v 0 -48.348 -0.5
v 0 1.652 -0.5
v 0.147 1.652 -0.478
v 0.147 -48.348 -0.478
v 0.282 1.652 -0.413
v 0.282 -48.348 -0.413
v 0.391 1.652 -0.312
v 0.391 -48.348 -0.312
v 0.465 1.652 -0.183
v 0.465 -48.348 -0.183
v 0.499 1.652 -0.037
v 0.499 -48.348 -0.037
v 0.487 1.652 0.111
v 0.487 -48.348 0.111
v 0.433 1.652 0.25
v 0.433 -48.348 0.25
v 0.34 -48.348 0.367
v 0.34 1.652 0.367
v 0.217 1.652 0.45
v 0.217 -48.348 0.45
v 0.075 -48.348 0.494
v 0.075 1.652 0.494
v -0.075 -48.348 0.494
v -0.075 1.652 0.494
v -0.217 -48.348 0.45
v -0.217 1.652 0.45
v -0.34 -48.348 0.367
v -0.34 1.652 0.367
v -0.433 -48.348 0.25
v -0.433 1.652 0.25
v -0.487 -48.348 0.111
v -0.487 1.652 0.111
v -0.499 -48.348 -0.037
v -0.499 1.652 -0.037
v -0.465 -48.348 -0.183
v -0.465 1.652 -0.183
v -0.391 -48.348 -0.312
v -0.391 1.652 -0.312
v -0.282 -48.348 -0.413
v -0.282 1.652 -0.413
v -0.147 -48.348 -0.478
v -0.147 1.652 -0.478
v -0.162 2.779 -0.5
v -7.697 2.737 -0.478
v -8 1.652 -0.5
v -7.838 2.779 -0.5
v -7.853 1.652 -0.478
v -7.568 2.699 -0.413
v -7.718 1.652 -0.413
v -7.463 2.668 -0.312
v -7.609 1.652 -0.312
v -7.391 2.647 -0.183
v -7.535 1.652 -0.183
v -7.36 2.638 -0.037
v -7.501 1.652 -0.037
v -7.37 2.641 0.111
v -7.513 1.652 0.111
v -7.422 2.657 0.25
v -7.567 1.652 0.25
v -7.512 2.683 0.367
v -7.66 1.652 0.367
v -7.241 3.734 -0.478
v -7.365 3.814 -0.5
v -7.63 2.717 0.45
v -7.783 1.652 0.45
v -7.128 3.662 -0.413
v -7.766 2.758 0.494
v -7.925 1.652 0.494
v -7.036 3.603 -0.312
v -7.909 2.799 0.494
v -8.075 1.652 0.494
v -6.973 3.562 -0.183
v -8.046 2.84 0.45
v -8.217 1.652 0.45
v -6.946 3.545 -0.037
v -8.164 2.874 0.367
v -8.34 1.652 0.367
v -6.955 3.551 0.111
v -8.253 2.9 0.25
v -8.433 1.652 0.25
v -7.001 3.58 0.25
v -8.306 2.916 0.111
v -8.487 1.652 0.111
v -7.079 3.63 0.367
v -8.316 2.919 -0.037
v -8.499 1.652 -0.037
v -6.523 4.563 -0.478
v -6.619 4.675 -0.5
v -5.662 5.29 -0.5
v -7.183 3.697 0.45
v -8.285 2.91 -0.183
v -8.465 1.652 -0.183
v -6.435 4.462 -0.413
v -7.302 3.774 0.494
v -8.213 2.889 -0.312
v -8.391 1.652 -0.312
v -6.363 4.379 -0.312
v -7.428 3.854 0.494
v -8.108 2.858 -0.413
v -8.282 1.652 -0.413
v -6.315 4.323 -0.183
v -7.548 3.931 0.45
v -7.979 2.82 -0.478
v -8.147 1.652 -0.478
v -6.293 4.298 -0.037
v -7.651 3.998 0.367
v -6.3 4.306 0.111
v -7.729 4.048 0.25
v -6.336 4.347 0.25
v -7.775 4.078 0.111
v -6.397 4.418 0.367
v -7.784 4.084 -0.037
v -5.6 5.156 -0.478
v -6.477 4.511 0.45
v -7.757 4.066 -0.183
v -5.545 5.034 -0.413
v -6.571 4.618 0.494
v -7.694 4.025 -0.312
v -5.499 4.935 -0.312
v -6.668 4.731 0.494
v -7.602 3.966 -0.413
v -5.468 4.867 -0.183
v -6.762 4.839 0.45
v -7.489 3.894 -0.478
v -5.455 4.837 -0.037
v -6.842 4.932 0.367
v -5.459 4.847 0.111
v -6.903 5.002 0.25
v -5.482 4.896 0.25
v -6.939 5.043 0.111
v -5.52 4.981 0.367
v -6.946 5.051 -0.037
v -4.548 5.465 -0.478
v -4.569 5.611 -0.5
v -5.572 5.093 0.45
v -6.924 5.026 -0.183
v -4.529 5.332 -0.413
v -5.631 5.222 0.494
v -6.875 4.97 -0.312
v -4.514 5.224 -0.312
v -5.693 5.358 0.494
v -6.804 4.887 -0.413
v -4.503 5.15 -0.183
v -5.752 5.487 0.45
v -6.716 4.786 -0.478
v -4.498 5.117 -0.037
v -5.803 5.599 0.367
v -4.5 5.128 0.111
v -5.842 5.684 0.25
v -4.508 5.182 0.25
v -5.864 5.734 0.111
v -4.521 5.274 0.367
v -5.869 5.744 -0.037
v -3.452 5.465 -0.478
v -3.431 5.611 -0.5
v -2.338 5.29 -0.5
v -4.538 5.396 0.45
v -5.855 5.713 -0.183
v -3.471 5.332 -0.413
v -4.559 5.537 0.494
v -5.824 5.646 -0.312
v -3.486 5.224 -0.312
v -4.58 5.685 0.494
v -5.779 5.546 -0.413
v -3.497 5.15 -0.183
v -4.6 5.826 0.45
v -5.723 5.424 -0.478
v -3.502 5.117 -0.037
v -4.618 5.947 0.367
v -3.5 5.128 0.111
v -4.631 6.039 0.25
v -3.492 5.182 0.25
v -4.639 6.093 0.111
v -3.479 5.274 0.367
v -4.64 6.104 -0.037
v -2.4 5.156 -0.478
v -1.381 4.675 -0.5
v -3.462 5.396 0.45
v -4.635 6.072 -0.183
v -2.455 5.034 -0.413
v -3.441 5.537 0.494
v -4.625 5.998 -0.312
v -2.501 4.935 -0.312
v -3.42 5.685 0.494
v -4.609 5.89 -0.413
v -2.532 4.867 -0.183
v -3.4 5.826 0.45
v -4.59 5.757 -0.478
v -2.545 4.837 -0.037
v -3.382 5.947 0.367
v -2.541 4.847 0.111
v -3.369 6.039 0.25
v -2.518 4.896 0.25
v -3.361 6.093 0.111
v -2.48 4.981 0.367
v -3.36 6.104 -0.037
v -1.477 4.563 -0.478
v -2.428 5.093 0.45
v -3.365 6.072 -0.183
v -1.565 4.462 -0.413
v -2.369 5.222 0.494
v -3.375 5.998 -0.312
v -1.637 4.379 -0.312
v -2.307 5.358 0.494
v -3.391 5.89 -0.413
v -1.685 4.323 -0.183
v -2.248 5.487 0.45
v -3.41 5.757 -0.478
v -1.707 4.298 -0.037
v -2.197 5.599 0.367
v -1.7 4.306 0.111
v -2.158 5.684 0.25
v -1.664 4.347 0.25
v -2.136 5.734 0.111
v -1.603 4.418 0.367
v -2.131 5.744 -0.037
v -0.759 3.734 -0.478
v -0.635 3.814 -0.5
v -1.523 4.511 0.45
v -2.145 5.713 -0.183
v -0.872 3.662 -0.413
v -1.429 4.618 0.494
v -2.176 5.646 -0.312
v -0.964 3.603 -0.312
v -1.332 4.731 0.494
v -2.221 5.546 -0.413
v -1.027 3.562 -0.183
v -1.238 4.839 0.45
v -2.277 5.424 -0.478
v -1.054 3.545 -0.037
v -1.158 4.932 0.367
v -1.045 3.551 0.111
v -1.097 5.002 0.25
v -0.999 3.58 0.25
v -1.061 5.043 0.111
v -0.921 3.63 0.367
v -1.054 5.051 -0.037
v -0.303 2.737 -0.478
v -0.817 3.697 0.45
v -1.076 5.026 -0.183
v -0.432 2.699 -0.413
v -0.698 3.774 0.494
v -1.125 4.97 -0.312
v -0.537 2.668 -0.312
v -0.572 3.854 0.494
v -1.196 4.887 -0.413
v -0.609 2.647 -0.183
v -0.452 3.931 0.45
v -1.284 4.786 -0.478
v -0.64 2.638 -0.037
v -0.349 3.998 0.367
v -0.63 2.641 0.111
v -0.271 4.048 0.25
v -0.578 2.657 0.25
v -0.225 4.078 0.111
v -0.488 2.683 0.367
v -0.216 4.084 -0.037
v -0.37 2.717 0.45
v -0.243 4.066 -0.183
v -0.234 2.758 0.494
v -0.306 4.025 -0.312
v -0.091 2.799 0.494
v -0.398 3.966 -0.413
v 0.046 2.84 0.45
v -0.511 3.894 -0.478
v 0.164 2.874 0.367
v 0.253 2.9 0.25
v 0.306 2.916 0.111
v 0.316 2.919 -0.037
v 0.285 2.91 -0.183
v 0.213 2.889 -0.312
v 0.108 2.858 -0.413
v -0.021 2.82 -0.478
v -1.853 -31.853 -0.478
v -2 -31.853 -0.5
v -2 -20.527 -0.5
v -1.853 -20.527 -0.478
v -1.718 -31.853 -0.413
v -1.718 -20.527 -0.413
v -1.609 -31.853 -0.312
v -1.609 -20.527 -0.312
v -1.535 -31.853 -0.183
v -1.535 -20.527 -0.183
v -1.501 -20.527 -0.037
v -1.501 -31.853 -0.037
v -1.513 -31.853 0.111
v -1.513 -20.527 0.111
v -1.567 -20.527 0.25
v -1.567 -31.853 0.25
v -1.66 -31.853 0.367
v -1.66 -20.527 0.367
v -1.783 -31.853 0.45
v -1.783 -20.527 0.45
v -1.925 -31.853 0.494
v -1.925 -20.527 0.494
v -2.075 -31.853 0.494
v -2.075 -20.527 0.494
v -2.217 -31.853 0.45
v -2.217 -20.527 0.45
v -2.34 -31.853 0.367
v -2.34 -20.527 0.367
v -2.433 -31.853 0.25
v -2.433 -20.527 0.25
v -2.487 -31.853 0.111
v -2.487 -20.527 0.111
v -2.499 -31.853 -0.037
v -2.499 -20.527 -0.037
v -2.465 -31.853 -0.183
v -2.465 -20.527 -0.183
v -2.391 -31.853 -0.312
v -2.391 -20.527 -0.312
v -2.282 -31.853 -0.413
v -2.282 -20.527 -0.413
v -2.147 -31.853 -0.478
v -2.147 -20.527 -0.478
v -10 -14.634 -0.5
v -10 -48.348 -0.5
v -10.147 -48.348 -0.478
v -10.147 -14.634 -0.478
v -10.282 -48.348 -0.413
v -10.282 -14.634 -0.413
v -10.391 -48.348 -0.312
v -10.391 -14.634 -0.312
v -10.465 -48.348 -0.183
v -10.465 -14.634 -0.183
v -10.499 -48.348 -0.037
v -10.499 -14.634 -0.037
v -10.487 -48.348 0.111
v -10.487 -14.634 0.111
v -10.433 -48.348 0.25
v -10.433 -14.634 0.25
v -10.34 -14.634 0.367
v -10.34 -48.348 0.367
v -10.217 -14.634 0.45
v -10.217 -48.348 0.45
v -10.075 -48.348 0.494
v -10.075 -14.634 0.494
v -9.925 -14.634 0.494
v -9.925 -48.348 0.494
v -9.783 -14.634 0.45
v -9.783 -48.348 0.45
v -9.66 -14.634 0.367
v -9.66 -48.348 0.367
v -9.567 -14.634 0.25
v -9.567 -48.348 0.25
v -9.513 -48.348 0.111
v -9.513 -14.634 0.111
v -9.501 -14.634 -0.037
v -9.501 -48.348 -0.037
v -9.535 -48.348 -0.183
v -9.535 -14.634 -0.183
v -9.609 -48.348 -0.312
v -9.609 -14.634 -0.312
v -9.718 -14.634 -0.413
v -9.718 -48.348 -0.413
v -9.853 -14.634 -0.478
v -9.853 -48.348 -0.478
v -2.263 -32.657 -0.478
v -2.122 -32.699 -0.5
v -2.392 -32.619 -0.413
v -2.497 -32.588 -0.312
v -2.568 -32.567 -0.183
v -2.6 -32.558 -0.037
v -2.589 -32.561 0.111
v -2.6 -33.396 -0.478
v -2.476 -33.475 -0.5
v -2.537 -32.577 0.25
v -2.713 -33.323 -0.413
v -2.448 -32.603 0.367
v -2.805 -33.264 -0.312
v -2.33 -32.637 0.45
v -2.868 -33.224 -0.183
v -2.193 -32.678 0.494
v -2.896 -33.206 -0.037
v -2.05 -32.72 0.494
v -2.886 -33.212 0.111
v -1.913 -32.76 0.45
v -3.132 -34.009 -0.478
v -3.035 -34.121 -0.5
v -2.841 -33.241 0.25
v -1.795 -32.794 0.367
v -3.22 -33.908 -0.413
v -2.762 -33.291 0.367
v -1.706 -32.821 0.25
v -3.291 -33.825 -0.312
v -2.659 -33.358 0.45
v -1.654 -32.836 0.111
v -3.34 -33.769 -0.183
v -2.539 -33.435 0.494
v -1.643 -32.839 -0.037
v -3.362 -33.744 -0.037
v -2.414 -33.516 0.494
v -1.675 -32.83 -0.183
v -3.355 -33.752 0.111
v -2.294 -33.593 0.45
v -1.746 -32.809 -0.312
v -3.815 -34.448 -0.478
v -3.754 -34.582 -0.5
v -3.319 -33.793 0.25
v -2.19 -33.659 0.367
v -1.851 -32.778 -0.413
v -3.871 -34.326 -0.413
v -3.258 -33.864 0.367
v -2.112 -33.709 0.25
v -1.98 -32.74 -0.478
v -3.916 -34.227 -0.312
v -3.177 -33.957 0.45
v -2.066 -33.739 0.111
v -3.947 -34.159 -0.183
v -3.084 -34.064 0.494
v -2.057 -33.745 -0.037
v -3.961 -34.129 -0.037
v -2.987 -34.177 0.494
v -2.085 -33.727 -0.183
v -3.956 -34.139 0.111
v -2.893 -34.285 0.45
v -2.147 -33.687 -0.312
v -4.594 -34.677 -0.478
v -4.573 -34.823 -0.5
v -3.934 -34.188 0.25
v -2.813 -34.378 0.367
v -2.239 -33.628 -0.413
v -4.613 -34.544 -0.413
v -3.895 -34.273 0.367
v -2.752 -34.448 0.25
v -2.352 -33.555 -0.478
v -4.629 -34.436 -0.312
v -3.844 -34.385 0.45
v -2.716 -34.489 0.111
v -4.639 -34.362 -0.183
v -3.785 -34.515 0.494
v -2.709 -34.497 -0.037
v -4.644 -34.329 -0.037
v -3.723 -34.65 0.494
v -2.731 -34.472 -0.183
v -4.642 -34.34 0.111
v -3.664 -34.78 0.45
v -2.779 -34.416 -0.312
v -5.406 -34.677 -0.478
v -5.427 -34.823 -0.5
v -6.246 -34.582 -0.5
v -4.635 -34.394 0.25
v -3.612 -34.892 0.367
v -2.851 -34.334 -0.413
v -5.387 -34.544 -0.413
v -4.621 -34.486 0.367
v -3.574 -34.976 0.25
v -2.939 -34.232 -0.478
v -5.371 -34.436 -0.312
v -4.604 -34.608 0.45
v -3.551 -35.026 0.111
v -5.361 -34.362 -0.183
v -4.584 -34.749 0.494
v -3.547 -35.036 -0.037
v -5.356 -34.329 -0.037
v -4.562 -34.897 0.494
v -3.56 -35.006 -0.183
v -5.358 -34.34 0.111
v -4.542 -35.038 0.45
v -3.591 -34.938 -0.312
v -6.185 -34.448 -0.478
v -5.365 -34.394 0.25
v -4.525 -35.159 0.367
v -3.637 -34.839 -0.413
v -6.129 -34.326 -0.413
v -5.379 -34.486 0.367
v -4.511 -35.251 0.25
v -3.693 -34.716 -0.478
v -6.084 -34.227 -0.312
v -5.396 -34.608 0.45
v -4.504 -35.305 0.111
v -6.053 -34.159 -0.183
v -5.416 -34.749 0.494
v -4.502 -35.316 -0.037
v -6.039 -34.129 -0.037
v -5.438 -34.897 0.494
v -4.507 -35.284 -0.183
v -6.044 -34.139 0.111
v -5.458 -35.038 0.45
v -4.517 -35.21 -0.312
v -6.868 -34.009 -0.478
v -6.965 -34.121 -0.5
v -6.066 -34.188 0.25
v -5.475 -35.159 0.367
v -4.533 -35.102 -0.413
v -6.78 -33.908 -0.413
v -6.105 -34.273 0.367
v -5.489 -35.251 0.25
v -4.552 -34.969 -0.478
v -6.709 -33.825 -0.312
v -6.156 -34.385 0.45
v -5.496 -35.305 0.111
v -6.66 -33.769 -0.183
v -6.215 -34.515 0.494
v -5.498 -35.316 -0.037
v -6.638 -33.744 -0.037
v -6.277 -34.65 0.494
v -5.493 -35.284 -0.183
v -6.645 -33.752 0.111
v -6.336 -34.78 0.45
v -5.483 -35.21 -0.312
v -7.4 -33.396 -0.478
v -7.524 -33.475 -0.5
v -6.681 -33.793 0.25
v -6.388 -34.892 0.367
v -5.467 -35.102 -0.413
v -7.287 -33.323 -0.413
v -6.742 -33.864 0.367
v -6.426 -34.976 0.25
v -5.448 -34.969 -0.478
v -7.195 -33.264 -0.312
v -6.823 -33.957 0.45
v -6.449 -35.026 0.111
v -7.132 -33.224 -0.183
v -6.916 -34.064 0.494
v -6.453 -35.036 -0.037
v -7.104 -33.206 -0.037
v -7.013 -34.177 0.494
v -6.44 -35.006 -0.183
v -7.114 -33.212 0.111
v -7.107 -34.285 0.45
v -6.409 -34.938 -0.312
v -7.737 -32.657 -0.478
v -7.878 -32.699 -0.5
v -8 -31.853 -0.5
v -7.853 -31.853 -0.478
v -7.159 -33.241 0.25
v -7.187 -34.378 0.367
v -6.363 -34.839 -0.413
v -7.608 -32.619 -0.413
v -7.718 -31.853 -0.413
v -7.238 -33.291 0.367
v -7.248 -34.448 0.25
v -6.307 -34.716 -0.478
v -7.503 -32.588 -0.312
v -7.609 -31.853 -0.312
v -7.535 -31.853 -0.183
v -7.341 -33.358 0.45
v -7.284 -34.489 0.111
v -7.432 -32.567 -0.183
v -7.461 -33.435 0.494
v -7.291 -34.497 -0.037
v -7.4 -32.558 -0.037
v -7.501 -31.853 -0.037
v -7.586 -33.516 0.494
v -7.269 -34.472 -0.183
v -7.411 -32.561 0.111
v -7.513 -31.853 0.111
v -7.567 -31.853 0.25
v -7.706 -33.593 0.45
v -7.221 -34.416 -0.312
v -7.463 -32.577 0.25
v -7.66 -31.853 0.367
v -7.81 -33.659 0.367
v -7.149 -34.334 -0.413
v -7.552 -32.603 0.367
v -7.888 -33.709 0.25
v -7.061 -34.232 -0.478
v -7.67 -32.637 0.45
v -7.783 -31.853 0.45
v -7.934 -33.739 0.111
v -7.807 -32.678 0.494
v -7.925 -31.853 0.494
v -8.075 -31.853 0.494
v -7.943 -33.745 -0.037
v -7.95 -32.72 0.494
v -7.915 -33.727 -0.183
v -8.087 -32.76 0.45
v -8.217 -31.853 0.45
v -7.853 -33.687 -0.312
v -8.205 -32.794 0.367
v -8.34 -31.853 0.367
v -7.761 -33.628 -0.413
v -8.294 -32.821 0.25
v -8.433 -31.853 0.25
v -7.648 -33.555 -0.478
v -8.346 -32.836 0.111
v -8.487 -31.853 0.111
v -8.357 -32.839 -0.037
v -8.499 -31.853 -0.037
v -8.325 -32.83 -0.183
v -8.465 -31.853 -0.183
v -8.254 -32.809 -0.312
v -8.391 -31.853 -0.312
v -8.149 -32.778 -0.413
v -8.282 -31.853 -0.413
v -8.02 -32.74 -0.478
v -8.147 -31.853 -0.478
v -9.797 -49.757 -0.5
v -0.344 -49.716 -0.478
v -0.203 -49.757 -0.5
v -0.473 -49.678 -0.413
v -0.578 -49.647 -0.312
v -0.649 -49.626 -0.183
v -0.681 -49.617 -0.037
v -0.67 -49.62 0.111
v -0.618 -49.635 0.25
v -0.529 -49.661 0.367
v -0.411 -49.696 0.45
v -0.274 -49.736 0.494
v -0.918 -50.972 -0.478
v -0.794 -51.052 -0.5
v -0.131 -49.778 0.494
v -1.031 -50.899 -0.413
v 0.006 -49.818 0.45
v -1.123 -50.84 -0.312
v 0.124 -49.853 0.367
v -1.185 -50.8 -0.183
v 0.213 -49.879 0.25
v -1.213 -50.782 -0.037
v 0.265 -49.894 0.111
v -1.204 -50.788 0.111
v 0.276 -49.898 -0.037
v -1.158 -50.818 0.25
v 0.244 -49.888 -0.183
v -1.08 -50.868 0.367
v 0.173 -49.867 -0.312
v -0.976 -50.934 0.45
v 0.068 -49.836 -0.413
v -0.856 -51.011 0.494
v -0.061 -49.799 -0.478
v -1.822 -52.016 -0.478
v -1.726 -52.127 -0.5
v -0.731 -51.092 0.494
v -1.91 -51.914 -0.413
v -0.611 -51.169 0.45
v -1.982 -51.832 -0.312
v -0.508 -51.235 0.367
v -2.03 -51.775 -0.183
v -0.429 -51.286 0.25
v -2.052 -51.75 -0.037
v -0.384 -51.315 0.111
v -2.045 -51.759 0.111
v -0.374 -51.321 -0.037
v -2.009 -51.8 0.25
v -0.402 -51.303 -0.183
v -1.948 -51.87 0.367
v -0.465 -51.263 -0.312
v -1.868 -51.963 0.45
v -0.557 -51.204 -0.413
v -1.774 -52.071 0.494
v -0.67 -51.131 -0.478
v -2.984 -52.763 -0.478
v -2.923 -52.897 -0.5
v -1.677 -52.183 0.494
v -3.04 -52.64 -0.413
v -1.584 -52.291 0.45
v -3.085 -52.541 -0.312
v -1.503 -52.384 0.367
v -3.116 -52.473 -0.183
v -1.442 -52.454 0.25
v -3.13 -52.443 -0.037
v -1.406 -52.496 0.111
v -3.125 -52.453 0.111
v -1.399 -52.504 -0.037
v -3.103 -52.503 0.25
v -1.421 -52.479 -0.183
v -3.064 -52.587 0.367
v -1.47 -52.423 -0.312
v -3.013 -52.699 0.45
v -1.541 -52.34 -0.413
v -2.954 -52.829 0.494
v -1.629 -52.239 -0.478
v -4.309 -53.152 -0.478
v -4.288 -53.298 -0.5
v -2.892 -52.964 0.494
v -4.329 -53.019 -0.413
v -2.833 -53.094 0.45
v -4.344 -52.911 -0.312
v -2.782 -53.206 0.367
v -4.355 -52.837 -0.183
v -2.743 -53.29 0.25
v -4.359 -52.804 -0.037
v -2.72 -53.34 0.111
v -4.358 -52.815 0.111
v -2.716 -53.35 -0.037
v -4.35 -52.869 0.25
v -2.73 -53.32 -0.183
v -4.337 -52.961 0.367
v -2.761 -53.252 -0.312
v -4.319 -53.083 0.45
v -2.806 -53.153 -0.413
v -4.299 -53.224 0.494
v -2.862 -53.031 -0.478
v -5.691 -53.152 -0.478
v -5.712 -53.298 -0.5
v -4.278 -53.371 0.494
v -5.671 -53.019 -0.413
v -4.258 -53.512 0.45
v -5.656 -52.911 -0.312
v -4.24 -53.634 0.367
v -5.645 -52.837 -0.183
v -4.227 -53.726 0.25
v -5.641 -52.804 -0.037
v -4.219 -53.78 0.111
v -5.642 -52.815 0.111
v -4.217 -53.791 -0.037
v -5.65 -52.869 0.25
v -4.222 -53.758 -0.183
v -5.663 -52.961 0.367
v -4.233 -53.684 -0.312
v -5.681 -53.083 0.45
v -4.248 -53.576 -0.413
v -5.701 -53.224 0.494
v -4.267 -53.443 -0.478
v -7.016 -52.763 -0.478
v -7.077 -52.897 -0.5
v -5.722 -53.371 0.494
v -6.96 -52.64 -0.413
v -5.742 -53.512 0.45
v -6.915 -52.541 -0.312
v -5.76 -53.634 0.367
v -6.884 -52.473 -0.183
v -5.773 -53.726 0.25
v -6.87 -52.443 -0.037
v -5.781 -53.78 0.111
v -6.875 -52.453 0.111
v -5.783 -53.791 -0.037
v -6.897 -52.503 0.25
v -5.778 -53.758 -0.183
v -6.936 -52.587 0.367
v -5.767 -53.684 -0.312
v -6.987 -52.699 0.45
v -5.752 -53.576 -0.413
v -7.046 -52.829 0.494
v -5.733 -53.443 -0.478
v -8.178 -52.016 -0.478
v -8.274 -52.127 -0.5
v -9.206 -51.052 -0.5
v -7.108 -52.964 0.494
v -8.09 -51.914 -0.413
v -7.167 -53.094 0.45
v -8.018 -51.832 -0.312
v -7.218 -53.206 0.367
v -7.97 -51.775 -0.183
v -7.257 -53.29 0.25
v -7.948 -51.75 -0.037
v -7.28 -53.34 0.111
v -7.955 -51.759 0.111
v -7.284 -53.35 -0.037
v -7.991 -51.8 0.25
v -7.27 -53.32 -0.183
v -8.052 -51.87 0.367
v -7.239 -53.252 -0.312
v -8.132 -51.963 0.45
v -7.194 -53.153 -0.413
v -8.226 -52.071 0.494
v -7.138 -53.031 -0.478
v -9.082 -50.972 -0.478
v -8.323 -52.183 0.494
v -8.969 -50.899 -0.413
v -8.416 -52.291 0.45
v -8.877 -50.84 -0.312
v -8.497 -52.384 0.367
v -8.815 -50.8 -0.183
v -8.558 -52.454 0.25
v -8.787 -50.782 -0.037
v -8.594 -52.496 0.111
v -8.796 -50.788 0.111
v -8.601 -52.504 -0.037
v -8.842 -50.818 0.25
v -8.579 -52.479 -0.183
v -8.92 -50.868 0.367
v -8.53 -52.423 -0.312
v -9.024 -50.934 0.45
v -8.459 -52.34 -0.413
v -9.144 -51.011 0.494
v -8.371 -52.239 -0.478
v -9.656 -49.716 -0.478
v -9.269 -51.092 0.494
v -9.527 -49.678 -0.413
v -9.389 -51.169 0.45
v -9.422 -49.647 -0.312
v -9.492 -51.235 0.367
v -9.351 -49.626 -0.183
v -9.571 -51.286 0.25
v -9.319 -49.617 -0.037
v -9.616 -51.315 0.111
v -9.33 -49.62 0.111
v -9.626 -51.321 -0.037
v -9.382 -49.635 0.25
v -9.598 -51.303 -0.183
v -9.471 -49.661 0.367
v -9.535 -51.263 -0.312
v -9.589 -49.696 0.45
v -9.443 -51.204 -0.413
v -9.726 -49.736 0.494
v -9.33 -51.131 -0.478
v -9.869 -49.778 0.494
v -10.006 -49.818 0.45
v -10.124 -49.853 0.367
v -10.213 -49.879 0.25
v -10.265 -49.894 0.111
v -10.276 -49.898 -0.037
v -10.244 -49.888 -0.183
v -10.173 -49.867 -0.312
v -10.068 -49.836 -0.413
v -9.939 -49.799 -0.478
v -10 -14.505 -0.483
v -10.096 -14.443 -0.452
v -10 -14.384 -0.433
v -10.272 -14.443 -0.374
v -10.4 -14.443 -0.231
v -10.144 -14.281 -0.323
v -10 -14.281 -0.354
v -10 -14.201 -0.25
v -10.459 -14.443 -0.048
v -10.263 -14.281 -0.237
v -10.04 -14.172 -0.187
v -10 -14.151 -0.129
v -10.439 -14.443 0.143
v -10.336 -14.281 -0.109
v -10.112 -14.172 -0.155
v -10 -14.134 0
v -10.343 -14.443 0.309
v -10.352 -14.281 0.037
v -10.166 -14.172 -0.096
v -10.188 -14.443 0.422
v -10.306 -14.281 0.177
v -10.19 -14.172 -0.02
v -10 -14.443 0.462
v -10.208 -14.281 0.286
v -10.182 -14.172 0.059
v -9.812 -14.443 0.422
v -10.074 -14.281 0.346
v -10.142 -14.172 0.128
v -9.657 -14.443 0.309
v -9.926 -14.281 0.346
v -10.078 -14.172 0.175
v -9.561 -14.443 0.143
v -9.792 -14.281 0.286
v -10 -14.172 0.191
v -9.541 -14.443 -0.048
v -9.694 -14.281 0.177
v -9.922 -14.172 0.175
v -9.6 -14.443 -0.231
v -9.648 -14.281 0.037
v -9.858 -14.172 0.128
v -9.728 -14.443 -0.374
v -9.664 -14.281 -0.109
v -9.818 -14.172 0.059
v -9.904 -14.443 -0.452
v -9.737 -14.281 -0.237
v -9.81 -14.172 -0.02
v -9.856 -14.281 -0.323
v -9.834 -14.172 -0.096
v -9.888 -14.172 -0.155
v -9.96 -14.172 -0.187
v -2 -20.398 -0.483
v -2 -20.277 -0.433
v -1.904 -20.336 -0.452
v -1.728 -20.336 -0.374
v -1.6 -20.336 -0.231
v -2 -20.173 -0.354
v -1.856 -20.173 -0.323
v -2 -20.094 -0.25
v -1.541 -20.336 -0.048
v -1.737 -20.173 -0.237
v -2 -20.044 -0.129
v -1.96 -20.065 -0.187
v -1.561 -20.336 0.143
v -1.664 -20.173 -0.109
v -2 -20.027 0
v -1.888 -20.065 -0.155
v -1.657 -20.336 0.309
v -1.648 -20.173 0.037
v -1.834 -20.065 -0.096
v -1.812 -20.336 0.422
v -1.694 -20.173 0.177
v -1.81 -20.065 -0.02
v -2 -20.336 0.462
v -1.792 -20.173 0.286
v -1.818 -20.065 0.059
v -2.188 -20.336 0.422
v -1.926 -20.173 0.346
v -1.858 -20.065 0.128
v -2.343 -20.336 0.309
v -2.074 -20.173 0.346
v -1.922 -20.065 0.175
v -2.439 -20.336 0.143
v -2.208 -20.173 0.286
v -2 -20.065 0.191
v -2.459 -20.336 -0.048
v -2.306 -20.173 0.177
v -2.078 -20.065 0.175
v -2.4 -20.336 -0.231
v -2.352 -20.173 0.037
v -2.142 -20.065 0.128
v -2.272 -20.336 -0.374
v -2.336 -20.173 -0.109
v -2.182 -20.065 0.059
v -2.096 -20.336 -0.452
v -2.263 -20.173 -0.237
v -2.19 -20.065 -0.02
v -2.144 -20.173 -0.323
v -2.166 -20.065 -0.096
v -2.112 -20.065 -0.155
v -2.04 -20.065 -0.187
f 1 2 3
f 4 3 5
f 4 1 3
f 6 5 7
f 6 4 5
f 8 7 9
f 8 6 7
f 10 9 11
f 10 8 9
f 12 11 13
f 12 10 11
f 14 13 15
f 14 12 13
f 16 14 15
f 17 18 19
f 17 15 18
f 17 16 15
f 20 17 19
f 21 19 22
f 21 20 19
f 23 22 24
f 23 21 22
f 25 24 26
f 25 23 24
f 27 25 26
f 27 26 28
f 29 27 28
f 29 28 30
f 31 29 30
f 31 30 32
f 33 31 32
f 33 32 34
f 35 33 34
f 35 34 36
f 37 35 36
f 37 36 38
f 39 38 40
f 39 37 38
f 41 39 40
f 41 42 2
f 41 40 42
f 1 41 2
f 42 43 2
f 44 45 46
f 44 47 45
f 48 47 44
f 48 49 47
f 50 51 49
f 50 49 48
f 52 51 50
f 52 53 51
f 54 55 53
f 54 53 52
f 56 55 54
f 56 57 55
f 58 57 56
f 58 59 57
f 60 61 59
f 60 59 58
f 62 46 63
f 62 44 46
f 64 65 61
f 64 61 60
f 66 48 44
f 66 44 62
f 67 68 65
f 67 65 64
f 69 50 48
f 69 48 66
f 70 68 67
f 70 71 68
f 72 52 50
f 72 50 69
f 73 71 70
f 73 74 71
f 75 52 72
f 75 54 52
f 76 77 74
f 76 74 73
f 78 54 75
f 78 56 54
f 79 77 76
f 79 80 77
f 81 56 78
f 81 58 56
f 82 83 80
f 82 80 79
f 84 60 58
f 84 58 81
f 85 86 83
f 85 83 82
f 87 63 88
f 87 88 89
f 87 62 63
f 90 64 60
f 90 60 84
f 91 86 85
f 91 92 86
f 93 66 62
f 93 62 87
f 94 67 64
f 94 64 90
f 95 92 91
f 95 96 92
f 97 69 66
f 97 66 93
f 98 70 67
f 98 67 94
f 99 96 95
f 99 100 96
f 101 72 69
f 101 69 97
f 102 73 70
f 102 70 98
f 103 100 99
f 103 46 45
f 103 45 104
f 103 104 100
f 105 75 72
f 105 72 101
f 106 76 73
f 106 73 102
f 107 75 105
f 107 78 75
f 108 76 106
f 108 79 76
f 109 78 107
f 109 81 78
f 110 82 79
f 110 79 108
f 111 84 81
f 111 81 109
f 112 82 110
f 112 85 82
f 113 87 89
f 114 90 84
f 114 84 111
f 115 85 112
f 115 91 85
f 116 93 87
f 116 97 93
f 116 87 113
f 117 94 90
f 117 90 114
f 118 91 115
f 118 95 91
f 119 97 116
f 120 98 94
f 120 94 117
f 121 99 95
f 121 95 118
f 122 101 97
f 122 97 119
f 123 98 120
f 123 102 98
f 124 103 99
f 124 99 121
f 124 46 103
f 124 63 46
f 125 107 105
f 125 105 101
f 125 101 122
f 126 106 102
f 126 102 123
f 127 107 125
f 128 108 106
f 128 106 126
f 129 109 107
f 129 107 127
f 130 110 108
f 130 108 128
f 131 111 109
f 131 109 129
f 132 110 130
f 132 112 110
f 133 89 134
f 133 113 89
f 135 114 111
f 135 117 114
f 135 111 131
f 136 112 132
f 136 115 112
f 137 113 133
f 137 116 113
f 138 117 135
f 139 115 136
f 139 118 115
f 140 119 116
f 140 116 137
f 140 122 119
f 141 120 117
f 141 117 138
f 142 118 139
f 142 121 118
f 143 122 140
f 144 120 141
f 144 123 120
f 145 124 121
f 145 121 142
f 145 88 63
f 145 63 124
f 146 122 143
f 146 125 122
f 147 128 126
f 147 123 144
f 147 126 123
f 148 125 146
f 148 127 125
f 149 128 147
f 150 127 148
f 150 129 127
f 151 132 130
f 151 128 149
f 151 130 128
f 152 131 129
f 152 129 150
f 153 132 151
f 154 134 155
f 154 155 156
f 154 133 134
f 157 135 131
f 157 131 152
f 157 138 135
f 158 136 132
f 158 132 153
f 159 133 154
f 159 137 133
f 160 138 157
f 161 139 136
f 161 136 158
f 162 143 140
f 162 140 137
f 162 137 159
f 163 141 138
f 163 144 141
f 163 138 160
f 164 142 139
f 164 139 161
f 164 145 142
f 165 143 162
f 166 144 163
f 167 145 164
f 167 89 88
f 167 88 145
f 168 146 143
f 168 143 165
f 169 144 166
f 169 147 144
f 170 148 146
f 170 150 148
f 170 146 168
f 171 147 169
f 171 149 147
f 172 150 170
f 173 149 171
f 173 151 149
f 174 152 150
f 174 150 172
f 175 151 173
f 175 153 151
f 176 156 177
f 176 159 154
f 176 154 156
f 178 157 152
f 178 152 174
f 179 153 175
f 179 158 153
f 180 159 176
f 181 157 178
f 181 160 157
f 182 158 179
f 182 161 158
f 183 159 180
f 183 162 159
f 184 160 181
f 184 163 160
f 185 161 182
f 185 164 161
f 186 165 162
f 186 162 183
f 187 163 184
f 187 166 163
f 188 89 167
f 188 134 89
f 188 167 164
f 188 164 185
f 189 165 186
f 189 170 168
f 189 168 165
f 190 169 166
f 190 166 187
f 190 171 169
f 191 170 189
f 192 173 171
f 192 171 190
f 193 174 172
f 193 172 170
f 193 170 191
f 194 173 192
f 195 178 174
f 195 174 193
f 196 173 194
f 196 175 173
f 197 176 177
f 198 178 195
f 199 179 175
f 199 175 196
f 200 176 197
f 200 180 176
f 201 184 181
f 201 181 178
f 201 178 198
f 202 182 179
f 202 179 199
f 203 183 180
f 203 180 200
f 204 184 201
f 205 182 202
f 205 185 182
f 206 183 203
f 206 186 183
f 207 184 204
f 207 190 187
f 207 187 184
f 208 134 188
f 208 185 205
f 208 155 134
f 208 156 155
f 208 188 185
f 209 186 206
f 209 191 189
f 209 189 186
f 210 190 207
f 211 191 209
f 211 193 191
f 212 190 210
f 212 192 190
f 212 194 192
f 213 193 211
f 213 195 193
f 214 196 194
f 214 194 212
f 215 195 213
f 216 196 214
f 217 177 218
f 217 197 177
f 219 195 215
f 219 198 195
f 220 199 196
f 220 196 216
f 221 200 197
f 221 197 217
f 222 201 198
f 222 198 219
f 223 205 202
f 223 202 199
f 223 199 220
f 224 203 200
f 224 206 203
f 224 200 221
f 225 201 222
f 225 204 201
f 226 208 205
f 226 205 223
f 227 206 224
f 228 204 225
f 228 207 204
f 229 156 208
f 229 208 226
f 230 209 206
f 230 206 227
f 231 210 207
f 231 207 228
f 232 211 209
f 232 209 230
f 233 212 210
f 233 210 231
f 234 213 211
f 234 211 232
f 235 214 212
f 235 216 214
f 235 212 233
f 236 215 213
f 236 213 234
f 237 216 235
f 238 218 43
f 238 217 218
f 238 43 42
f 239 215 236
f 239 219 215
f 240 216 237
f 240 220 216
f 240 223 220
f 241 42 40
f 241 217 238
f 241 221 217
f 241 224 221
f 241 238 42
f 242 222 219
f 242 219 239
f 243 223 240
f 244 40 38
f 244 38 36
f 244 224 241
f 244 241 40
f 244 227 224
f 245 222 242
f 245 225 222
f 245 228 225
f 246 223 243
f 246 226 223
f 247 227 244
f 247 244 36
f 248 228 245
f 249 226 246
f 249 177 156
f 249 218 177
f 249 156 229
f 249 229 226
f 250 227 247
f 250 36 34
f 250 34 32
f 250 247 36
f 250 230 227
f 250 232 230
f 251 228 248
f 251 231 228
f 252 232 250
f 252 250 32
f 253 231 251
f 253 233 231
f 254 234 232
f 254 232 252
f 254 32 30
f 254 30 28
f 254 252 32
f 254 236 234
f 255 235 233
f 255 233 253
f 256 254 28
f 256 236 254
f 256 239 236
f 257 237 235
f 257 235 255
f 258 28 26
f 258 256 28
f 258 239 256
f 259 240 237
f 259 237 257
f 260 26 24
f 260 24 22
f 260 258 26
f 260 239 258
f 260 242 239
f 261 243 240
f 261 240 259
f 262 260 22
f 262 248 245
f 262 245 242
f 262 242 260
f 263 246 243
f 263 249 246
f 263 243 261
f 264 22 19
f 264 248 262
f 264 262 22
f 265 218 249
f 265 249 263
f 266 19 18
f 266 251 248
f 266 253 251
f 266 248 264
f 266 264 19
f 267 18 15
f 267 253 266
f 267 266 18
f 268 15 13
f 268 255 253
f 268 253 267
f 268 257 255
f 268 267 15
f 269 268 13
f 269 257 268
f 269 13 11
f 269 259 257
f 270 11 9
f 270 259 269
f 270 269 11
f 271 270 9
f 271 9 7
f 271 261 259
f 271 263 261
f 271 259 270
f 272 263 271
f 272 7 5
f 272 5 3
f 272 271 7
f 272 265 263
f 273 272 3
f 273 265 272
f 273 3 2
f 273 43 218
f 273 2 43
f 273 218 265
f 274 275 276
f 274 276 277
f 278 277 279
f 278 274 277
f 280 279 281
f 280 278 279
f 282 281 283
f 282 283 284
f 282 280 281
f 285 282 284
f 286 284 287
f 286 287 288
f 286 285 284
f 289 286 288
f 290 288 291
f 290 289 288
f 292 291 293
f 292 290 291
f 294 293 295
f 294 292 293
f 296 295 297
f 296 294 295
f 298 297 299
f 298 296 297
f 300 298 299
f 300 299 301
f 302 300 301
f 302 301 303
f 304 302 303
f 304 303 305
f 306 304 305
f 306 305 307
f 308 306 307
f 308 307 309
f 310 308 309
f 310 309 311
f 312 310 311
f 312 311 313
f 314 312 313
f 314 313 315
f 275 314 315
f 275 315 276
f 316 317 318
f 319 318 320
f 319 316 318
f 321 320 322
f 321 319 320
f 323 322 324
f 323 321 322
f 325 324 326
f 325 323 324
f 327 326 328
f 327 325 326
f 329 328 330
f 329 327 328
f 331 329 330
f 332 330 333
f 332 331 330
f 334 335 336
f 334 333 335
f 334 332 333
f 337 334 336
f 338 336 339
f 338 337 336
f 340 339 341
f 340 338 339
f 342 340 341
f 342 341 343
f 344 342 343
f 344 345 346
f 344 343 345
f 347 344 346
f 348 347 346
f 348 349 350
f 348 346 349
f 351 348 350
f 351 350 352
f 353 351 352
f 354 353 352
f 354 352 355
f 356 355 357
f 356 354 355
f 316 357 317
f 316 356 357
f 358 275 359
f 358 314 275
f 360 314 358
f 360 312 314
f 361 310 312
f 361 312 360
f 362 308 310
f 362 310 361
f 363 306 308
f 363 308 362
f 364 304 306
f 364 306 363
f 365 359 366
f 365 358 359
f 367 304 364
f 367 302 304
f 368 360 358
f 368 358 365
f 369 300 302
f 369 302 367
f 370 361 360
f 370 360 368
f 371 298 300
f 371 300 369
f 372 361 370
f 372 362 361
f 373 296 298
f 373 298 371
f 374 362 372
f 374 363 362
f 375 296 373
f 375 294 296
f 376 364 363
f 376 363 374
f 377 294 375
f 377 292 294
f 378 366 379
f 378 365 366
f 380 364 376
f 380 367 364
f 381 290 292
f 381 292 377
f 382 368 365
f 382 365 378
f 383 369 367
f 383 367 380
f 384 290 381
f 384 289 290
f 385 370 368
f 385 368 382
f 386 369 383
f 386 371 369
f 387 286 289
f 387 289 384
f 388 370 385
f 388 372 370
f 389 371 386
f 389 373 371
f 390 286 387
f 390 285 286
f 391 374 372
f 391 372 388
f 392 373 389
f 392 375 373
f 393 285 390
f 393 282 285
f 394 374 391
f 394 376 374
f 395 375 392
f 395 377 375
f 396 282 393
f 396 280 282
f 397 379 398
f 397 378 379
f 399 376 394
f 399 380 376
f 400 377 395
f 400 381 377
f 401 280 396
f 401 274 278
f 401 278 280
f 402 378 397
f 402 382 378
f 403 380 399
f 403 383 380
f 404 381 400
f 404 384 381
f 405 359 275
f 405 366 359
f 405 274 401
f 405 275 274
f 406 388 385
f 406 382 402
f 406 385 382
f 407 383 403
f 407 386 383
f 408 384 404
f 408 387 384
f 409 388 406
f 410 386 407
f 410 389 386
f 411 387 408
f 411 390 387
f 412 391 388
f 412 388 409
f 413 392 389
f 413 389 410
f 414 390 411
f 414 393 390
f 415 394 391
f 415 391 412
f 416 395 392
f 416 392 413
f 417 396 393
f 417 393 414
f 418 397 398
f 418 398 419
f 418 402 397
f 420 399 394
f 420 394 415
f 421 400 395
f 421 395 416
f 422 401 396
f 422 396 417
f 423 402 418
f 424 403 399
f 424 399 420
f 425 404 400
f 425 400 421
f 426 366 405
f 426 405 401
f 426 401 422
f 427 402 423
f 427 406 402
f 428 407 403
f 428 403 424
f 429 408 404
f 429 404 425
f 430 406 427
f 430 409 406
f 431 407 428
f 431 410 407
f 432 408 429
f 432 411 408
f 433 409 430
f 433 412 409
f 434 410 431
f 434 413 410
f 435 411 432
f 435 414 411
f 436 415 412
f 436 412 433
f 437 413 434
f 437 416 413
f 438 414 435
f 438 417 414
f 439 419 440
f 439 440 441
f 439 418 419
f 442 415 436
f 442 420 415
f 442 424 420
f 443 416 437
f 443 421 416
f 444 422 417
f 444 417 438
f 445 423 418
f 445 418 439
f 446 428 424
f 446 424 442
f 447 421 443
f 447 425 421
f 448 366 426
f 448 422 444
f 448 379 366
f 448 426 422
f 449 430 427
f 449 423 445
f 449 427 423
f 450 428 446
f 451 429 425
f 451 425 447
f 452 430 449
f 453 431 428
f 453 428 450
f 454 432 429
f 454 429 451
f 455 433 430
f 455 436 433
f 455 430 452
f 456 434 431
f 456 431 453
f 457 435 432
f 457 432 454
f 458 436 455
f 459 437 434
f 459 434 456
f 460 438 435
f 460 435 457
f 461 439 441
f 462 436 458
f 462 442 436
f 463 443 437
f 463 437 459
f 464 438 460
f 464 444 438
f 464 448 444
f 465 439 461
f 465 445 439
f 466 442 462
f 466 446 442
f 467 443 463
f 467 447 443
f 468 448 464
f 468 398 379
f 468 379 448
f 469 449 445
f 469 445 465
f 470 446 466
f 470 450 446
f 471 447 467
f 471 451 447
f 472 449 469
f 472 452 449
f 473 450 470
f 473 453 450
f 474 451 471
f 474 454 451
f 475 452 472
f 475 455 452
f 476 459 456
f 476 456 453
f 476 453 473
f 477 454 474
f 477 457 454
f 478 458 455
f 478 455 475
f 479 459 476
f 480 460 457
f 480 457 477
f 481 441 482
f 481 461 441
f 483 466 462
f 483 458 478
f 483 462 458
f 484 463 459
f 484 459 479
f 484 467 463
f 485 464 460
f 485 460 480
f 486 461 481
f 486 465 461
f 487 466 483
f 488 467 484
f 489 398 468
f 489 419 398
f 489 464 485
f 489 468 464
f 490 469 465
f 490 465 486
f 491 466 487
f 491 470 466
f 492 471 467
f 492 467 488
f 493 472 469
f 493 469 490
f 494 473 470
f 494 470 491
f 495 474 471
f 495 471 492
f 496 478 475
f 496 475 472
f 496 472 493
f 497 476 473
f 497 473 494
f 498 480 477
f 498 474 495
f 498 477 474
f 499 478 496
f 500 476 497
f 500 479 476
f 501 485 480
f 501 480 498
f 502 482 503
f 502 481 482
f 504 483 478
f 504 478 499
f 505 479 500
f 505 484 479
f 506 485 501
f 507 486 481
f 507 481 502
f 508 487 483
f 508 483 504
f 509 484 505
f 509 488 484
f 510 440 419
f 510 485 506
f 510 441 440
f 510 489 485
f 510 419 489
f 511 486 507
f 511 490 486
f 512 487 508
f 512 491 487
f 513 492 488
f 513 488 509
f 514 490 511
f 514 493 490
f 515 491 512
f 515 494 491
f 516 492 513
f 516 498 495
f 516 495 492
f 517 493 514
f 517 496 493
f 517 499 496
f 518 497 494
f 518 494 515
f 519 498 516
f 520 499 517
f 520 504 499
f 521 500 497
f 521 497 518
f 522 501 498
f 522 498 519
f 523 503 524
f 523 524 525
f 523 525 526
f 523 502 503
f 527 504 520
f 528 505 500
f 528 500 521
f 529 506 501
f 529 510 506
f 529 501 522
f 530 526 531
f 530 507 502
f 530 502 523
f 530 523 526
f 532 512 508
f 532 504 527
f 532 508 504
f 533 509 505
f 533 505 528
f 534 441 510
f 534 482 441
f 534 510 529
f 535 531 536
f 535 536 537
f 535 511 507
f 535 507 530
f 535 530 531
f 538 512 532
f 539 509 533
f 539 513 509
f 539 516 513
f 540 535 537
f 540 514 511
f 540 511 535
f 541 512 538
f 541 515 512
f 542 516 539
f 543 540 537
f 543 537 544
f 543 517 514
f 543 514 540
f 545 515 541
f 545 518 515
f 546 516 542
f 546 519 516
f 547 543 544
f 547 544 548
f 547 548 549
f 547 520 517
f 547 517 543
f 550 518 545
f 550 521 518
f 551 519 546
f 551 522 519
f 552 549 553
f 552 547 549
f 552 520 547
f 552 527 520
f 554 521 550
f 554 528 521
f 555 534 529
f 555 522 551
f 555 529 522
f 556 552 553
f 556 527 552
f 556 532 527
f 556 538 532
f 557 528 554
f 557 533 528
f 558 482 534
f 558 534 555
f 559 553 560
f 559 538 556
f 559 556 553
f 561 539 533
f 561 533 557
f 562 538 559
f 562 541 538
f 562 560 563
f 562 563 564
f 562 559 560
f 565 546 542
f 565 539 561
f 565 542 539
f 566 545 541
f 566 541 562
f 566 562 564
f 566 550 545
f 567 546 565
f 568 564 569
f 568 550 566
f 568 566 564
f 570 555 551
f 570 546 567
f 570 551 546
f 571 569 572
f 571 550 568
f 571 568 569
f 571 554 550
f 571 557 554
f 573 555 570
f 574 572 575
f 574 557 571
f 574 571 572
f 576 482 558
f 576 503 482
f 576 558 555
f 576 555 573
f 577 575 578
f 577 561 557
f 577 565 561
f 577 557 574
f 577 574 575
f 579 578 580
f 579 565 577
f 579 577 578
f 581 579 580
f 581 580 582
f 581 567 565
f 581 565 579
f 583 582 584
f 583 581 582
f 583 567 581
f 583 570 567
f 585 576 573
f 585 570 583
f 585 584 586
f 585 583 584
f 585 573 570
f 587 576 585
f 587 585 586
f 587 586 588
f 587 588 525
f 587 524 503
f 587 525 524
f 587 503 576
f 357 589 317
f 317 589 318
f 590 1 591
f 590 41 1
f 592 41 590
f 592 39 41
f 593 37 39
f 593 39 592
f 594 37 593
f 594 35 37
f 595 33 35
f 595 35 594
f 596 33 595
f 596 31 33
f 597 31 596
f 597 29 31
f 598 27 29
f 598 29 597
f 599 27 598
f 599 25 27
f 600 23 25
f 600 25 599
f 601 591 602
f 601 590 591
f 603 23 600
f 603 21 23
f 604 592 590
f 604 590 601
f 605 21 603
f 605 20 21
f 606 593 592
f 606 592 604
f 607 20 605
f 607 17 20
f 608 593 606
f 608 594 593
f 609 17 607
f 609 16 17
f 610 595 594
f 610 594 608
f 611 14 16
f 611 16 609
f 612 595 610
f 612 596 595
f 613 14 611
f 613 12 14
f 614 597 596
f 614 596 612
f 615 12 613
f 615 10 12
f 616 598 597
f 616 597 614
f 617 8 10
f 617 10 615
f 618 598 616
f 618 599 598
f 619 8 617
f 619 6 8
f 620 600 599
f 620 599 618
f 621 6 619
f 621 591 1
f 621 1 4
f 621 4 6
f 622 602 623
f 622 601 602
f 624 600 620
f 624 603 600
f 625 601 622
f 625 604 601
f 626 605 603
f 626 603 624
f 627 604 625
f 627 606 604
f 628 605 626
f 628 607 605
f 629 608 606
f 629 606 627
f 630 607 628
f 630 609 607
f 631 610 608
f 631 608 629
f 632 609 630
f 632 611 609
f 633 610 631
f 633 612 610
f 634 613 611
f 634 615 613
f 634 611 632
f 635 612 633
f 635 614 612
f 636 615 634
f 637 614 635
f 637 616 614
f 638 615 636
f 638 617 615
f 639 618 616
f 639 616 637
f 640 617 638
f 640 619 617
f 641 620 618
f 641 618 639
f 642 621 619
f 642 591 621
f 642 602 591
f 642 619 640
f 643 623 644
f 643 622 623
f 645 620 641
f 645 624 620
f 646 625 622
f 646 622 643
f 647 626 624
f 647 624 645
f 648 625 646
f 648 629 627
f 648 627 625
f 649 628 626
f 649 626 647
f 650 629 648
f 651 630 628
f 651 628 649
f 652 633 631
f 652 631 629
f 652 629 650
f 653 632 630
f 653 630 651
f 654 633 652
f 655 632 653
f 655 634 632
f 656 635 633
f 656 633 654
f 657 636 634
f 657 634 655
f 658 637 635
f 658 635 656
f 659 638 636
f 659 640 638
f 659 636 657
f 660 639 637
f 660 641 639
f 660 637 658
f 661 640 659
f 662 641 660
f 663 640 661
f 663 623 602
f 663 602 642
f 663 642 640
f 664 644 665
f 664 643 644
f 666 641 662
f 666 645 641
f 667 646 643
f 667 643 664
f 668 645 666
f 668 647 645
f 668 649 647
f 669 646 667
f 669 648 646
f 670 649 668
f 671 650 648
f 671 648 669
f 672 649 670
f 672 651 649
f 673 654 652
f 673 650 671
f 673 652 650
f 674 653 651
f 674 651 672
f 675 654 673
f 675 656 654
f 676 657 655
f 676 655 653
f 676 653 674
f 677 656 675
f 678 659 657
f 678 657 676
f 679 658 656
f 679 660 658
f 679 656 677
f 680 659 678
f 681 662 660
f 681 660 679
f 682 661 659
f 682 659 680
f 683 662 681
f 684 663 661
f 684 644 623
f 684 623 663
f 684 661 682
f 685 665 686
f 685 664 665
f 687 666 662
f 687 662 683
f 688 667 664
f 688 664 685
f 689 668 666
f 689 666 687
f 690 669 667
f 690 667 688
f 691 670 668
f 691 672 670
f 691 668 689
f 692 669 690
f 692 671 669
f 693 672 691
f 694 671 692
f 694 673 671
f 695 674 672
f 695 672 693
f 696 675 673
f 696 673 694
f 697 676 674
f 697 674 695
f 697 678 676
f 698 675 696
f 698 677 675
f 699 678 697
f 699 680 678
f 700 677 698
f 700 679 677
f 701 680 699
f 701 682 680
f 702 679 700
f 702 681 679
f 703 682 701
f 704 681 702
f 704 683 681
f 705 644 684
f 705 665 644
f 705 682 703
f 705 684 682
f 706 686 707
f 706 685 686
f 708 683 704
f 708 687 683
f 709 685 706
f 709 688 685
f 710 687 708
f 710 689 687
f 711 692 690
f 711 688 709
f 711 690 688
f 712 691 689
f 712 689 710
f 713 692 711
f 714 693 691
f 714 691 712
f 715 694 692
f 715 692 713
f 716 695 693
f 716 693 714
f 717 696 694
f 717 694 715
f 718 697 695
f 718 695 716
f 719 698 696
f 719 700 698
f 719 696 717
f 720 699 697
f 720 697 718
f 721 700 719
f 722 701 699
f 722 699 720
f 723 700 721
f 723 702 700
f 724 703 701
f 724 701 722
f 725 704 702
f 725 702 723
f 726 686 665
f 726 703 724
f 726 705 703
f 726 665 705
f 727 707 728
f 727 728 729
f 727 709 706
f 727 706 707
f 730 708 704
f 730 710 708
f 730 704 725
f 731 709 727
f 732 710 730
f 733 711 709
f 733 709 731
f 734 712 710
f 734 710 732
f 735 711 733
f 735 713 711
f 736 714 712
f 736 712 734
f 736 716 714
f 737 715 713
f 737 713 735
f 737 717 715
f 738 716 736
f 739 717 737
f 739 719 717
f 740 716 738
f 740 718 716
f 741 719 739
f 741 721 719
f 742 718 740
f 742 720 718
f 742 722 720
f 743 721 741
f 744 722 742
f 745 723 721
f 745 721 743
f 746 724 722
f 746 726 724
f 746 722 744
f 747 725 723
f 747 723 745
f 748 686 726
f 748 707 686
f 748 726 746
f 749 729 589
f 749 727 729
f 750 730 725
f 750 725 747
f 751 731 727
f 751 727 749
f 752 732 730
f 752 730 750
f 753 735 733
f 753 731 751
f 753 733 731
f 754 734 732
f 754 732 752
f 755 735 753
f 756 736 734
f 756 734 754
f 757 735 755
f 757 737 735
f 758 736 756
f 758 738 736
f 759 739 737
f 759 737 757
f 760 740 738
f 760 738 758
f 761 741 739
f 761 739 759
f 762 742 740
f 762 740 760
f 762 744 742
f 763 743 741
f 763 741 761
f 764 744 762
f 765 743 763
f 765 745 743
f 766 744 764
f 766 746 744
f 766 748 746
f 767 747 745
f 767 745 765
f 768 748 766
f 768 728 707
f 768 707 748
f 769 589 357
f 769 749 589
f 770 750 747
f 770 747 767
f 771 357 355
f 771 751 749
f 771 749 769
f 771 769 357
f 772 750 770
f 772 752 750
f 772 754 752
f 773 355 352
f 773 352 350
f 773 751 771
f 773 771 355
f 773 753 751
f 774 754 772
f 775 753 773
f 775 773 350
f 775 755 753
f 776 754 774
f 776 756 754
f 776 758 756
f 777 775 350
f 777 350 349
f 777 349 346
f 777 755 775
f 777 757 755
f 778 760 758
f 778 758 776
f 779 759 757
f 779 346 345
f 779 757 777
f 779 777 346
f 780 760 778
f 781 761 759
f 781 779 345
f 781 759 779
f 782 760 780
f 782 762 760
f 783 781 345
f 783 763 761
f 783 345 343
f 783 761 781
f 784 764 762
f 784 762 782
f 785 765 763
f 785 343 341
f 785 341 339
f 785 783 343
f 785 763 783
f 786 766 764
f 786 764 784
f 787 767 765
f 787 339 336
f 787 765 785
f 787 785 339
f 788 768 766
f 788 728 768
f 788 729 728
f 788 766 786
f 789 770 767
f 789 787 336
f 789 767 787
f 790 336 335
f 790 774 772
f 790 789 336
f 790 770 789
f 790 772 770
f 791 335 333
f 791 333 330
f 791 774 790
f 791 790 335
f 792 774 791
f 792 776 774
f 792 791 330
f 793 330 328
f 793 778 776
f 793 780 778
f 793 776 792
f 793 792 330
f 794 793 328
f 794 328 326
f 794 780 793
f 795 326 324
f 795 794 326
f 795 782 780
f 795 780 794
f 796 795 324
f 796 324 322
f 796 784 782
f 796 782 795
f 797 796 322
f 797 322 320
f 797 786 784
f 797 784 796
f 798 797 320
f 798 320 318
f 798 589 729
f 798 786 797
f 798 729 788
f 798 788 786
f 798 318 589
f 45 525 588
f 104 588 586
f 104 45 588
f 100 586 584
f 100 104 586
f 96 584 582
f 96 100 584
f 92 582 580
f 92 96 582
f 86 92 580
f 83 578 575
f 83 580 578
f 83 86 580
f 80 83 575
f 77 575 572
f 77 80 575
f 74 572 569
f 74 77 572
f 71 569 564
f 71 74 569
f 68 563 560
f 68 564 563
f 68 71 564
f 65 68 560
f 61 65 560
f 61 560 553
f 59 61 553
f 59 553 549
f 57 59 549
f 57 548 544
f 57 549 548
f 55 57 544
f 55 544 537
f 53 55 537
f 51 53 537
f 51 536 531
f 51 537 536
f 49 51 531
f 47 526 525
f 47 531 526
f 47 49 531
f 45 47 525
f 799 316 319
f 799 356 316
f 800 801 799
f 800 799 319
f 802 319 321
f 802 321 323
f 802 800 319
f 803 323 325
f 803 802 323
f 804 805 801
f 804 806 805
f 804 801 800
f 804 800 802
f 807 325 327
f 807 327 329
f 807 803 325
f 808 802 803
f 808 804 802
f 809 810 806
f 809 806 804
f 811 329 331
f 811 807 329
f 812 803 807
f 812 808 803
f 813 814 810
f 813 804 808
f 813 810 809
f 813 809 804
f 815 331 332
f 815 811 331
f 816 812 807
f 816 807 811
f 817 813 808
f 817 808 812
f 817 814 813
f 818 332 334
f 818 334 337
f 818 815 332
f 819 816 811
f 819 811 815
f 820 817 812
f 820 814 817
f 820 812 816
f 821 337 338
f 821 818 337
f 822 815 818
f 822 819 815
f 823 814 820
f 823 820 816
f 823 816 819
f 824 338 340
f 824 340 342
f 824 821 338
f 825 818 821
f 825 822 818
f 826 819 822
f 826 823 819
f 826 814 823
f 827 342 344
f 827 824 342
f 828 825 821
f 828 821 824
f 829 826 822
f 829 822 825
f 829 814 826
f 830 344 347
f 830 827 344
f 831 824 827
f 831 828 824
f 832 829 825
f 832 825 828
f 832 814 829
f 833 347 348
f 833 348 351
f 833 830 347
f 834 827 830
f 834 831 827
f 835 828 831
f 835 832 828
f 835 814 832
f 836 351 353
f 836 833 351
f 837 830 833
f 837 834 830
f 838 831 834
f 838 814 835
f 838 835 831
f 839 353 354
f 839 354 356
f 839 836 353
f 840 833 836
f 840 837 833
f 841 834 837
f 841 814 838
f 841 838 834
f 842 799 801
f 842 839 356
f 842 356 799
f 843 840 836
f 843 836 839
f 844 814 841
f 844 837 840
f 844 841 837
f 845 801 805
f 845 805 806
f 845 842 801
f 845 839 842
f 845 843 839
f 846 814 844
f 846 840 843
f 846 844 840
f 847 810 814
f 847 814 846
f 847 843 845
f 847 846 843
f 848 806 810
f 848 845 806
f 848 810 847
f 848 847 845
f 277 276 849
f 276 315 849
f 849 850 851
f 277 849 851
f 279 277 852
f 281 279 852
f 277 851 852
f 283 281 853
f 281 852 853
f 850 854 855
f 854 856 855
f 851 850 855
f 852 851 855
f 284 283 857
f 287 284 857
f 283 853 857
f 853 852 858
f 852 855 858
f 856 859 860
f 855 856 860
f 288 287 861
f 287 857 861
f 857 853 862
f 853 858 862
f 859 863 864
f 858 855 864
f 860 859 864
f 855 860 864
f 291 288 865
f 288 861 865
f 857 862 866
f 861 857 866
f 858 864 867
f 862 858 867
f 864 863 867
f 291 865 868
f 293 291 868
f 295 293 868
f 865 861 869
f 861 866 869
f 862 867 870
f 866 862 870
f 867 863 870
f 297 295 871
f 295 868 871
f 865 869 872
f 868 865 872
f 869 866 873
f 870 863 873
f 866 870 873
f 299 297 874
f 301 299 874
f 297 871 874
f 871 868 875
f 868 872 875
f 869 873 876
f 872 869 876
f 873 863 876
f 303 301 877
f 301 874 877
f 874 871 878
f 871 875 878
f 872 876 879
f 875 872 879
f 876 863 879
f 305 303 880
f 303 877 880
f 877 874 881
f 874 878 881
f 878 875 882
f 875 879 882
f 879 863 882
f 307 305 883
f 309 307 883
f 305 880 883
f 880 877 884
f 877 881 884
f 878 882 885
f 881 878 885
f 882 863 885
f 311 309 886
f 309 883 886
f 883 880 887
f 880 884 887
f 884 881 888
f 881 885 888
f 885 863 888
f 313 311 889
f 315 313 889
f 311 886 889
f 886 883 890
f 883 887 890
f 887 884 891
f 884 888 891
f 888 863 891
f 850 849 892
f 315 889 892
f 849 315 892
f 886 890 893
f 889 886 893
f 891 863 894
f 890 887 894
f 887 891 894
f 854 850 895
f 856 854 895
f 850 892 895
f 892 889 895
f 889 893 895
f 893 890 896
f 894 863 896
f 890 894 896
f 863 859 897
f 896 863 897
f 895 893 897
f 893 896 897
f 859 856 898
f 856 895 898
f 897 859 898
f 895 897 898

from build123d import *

# Parameters (mm, degrees)
BARRER1_PROFILE_R = 0.5
REDONDEO1_R       = 0.5
REDONDEO2_R       = 0.5


with BuildPart() as part:
    # Barrer1: sweep along a path in Croquis2
    with BuildLine(Plane.XY) as barrer1_path:
        Line((-2, -20.026919646), (-2, -31.853401443))
        ThreePointArc((-2, -31.853401443), (-5, -34.853401443), (-8, -31.853401443))
        Line((-8, -31.853401443), (-8, 1.651570193))
        ThreePointArc((-8, 1.651570193), (-4, 5.651570193), (0, 1.651570193))
        Line((0, 1.651570193), (0, -48.348429807))
        ThreePointArc((0, -48.348429807), (-5, -53.348429807), (-10, -48.348429807))
        Line((-10, -48.348429807), (-10, -14.134208692))
    # Barrer1 profile (on start of the path) → Barrer1 (sweep)
    with BuildSketch(Plane(origin=(-2, -20.026919646, 0), x_dir=(0, 0, -1), z_dir=(0, -1, 0))):
        Circle(BARRER1_PROFILE_R)
    sweep(path=barrer1_path.line)

    # Redondeo1
    redondeo1_edges = [part.edges().sort_by_distance(p)[0] for p in [
        (-2, -20.026919646, 0.5),
    ]]
    fillet(redondeo1_edges, radius=REDONDEO1_R)

    # Redondeo2
    redondeo2_edges = [part.edges().sort_by_distance(p)[0] for p in [
        (-10, -14.134208692, 0.5),
    ]]
    fillet(redondeo2_edges, radius=REDONDEO2_R)


solid = part.part
